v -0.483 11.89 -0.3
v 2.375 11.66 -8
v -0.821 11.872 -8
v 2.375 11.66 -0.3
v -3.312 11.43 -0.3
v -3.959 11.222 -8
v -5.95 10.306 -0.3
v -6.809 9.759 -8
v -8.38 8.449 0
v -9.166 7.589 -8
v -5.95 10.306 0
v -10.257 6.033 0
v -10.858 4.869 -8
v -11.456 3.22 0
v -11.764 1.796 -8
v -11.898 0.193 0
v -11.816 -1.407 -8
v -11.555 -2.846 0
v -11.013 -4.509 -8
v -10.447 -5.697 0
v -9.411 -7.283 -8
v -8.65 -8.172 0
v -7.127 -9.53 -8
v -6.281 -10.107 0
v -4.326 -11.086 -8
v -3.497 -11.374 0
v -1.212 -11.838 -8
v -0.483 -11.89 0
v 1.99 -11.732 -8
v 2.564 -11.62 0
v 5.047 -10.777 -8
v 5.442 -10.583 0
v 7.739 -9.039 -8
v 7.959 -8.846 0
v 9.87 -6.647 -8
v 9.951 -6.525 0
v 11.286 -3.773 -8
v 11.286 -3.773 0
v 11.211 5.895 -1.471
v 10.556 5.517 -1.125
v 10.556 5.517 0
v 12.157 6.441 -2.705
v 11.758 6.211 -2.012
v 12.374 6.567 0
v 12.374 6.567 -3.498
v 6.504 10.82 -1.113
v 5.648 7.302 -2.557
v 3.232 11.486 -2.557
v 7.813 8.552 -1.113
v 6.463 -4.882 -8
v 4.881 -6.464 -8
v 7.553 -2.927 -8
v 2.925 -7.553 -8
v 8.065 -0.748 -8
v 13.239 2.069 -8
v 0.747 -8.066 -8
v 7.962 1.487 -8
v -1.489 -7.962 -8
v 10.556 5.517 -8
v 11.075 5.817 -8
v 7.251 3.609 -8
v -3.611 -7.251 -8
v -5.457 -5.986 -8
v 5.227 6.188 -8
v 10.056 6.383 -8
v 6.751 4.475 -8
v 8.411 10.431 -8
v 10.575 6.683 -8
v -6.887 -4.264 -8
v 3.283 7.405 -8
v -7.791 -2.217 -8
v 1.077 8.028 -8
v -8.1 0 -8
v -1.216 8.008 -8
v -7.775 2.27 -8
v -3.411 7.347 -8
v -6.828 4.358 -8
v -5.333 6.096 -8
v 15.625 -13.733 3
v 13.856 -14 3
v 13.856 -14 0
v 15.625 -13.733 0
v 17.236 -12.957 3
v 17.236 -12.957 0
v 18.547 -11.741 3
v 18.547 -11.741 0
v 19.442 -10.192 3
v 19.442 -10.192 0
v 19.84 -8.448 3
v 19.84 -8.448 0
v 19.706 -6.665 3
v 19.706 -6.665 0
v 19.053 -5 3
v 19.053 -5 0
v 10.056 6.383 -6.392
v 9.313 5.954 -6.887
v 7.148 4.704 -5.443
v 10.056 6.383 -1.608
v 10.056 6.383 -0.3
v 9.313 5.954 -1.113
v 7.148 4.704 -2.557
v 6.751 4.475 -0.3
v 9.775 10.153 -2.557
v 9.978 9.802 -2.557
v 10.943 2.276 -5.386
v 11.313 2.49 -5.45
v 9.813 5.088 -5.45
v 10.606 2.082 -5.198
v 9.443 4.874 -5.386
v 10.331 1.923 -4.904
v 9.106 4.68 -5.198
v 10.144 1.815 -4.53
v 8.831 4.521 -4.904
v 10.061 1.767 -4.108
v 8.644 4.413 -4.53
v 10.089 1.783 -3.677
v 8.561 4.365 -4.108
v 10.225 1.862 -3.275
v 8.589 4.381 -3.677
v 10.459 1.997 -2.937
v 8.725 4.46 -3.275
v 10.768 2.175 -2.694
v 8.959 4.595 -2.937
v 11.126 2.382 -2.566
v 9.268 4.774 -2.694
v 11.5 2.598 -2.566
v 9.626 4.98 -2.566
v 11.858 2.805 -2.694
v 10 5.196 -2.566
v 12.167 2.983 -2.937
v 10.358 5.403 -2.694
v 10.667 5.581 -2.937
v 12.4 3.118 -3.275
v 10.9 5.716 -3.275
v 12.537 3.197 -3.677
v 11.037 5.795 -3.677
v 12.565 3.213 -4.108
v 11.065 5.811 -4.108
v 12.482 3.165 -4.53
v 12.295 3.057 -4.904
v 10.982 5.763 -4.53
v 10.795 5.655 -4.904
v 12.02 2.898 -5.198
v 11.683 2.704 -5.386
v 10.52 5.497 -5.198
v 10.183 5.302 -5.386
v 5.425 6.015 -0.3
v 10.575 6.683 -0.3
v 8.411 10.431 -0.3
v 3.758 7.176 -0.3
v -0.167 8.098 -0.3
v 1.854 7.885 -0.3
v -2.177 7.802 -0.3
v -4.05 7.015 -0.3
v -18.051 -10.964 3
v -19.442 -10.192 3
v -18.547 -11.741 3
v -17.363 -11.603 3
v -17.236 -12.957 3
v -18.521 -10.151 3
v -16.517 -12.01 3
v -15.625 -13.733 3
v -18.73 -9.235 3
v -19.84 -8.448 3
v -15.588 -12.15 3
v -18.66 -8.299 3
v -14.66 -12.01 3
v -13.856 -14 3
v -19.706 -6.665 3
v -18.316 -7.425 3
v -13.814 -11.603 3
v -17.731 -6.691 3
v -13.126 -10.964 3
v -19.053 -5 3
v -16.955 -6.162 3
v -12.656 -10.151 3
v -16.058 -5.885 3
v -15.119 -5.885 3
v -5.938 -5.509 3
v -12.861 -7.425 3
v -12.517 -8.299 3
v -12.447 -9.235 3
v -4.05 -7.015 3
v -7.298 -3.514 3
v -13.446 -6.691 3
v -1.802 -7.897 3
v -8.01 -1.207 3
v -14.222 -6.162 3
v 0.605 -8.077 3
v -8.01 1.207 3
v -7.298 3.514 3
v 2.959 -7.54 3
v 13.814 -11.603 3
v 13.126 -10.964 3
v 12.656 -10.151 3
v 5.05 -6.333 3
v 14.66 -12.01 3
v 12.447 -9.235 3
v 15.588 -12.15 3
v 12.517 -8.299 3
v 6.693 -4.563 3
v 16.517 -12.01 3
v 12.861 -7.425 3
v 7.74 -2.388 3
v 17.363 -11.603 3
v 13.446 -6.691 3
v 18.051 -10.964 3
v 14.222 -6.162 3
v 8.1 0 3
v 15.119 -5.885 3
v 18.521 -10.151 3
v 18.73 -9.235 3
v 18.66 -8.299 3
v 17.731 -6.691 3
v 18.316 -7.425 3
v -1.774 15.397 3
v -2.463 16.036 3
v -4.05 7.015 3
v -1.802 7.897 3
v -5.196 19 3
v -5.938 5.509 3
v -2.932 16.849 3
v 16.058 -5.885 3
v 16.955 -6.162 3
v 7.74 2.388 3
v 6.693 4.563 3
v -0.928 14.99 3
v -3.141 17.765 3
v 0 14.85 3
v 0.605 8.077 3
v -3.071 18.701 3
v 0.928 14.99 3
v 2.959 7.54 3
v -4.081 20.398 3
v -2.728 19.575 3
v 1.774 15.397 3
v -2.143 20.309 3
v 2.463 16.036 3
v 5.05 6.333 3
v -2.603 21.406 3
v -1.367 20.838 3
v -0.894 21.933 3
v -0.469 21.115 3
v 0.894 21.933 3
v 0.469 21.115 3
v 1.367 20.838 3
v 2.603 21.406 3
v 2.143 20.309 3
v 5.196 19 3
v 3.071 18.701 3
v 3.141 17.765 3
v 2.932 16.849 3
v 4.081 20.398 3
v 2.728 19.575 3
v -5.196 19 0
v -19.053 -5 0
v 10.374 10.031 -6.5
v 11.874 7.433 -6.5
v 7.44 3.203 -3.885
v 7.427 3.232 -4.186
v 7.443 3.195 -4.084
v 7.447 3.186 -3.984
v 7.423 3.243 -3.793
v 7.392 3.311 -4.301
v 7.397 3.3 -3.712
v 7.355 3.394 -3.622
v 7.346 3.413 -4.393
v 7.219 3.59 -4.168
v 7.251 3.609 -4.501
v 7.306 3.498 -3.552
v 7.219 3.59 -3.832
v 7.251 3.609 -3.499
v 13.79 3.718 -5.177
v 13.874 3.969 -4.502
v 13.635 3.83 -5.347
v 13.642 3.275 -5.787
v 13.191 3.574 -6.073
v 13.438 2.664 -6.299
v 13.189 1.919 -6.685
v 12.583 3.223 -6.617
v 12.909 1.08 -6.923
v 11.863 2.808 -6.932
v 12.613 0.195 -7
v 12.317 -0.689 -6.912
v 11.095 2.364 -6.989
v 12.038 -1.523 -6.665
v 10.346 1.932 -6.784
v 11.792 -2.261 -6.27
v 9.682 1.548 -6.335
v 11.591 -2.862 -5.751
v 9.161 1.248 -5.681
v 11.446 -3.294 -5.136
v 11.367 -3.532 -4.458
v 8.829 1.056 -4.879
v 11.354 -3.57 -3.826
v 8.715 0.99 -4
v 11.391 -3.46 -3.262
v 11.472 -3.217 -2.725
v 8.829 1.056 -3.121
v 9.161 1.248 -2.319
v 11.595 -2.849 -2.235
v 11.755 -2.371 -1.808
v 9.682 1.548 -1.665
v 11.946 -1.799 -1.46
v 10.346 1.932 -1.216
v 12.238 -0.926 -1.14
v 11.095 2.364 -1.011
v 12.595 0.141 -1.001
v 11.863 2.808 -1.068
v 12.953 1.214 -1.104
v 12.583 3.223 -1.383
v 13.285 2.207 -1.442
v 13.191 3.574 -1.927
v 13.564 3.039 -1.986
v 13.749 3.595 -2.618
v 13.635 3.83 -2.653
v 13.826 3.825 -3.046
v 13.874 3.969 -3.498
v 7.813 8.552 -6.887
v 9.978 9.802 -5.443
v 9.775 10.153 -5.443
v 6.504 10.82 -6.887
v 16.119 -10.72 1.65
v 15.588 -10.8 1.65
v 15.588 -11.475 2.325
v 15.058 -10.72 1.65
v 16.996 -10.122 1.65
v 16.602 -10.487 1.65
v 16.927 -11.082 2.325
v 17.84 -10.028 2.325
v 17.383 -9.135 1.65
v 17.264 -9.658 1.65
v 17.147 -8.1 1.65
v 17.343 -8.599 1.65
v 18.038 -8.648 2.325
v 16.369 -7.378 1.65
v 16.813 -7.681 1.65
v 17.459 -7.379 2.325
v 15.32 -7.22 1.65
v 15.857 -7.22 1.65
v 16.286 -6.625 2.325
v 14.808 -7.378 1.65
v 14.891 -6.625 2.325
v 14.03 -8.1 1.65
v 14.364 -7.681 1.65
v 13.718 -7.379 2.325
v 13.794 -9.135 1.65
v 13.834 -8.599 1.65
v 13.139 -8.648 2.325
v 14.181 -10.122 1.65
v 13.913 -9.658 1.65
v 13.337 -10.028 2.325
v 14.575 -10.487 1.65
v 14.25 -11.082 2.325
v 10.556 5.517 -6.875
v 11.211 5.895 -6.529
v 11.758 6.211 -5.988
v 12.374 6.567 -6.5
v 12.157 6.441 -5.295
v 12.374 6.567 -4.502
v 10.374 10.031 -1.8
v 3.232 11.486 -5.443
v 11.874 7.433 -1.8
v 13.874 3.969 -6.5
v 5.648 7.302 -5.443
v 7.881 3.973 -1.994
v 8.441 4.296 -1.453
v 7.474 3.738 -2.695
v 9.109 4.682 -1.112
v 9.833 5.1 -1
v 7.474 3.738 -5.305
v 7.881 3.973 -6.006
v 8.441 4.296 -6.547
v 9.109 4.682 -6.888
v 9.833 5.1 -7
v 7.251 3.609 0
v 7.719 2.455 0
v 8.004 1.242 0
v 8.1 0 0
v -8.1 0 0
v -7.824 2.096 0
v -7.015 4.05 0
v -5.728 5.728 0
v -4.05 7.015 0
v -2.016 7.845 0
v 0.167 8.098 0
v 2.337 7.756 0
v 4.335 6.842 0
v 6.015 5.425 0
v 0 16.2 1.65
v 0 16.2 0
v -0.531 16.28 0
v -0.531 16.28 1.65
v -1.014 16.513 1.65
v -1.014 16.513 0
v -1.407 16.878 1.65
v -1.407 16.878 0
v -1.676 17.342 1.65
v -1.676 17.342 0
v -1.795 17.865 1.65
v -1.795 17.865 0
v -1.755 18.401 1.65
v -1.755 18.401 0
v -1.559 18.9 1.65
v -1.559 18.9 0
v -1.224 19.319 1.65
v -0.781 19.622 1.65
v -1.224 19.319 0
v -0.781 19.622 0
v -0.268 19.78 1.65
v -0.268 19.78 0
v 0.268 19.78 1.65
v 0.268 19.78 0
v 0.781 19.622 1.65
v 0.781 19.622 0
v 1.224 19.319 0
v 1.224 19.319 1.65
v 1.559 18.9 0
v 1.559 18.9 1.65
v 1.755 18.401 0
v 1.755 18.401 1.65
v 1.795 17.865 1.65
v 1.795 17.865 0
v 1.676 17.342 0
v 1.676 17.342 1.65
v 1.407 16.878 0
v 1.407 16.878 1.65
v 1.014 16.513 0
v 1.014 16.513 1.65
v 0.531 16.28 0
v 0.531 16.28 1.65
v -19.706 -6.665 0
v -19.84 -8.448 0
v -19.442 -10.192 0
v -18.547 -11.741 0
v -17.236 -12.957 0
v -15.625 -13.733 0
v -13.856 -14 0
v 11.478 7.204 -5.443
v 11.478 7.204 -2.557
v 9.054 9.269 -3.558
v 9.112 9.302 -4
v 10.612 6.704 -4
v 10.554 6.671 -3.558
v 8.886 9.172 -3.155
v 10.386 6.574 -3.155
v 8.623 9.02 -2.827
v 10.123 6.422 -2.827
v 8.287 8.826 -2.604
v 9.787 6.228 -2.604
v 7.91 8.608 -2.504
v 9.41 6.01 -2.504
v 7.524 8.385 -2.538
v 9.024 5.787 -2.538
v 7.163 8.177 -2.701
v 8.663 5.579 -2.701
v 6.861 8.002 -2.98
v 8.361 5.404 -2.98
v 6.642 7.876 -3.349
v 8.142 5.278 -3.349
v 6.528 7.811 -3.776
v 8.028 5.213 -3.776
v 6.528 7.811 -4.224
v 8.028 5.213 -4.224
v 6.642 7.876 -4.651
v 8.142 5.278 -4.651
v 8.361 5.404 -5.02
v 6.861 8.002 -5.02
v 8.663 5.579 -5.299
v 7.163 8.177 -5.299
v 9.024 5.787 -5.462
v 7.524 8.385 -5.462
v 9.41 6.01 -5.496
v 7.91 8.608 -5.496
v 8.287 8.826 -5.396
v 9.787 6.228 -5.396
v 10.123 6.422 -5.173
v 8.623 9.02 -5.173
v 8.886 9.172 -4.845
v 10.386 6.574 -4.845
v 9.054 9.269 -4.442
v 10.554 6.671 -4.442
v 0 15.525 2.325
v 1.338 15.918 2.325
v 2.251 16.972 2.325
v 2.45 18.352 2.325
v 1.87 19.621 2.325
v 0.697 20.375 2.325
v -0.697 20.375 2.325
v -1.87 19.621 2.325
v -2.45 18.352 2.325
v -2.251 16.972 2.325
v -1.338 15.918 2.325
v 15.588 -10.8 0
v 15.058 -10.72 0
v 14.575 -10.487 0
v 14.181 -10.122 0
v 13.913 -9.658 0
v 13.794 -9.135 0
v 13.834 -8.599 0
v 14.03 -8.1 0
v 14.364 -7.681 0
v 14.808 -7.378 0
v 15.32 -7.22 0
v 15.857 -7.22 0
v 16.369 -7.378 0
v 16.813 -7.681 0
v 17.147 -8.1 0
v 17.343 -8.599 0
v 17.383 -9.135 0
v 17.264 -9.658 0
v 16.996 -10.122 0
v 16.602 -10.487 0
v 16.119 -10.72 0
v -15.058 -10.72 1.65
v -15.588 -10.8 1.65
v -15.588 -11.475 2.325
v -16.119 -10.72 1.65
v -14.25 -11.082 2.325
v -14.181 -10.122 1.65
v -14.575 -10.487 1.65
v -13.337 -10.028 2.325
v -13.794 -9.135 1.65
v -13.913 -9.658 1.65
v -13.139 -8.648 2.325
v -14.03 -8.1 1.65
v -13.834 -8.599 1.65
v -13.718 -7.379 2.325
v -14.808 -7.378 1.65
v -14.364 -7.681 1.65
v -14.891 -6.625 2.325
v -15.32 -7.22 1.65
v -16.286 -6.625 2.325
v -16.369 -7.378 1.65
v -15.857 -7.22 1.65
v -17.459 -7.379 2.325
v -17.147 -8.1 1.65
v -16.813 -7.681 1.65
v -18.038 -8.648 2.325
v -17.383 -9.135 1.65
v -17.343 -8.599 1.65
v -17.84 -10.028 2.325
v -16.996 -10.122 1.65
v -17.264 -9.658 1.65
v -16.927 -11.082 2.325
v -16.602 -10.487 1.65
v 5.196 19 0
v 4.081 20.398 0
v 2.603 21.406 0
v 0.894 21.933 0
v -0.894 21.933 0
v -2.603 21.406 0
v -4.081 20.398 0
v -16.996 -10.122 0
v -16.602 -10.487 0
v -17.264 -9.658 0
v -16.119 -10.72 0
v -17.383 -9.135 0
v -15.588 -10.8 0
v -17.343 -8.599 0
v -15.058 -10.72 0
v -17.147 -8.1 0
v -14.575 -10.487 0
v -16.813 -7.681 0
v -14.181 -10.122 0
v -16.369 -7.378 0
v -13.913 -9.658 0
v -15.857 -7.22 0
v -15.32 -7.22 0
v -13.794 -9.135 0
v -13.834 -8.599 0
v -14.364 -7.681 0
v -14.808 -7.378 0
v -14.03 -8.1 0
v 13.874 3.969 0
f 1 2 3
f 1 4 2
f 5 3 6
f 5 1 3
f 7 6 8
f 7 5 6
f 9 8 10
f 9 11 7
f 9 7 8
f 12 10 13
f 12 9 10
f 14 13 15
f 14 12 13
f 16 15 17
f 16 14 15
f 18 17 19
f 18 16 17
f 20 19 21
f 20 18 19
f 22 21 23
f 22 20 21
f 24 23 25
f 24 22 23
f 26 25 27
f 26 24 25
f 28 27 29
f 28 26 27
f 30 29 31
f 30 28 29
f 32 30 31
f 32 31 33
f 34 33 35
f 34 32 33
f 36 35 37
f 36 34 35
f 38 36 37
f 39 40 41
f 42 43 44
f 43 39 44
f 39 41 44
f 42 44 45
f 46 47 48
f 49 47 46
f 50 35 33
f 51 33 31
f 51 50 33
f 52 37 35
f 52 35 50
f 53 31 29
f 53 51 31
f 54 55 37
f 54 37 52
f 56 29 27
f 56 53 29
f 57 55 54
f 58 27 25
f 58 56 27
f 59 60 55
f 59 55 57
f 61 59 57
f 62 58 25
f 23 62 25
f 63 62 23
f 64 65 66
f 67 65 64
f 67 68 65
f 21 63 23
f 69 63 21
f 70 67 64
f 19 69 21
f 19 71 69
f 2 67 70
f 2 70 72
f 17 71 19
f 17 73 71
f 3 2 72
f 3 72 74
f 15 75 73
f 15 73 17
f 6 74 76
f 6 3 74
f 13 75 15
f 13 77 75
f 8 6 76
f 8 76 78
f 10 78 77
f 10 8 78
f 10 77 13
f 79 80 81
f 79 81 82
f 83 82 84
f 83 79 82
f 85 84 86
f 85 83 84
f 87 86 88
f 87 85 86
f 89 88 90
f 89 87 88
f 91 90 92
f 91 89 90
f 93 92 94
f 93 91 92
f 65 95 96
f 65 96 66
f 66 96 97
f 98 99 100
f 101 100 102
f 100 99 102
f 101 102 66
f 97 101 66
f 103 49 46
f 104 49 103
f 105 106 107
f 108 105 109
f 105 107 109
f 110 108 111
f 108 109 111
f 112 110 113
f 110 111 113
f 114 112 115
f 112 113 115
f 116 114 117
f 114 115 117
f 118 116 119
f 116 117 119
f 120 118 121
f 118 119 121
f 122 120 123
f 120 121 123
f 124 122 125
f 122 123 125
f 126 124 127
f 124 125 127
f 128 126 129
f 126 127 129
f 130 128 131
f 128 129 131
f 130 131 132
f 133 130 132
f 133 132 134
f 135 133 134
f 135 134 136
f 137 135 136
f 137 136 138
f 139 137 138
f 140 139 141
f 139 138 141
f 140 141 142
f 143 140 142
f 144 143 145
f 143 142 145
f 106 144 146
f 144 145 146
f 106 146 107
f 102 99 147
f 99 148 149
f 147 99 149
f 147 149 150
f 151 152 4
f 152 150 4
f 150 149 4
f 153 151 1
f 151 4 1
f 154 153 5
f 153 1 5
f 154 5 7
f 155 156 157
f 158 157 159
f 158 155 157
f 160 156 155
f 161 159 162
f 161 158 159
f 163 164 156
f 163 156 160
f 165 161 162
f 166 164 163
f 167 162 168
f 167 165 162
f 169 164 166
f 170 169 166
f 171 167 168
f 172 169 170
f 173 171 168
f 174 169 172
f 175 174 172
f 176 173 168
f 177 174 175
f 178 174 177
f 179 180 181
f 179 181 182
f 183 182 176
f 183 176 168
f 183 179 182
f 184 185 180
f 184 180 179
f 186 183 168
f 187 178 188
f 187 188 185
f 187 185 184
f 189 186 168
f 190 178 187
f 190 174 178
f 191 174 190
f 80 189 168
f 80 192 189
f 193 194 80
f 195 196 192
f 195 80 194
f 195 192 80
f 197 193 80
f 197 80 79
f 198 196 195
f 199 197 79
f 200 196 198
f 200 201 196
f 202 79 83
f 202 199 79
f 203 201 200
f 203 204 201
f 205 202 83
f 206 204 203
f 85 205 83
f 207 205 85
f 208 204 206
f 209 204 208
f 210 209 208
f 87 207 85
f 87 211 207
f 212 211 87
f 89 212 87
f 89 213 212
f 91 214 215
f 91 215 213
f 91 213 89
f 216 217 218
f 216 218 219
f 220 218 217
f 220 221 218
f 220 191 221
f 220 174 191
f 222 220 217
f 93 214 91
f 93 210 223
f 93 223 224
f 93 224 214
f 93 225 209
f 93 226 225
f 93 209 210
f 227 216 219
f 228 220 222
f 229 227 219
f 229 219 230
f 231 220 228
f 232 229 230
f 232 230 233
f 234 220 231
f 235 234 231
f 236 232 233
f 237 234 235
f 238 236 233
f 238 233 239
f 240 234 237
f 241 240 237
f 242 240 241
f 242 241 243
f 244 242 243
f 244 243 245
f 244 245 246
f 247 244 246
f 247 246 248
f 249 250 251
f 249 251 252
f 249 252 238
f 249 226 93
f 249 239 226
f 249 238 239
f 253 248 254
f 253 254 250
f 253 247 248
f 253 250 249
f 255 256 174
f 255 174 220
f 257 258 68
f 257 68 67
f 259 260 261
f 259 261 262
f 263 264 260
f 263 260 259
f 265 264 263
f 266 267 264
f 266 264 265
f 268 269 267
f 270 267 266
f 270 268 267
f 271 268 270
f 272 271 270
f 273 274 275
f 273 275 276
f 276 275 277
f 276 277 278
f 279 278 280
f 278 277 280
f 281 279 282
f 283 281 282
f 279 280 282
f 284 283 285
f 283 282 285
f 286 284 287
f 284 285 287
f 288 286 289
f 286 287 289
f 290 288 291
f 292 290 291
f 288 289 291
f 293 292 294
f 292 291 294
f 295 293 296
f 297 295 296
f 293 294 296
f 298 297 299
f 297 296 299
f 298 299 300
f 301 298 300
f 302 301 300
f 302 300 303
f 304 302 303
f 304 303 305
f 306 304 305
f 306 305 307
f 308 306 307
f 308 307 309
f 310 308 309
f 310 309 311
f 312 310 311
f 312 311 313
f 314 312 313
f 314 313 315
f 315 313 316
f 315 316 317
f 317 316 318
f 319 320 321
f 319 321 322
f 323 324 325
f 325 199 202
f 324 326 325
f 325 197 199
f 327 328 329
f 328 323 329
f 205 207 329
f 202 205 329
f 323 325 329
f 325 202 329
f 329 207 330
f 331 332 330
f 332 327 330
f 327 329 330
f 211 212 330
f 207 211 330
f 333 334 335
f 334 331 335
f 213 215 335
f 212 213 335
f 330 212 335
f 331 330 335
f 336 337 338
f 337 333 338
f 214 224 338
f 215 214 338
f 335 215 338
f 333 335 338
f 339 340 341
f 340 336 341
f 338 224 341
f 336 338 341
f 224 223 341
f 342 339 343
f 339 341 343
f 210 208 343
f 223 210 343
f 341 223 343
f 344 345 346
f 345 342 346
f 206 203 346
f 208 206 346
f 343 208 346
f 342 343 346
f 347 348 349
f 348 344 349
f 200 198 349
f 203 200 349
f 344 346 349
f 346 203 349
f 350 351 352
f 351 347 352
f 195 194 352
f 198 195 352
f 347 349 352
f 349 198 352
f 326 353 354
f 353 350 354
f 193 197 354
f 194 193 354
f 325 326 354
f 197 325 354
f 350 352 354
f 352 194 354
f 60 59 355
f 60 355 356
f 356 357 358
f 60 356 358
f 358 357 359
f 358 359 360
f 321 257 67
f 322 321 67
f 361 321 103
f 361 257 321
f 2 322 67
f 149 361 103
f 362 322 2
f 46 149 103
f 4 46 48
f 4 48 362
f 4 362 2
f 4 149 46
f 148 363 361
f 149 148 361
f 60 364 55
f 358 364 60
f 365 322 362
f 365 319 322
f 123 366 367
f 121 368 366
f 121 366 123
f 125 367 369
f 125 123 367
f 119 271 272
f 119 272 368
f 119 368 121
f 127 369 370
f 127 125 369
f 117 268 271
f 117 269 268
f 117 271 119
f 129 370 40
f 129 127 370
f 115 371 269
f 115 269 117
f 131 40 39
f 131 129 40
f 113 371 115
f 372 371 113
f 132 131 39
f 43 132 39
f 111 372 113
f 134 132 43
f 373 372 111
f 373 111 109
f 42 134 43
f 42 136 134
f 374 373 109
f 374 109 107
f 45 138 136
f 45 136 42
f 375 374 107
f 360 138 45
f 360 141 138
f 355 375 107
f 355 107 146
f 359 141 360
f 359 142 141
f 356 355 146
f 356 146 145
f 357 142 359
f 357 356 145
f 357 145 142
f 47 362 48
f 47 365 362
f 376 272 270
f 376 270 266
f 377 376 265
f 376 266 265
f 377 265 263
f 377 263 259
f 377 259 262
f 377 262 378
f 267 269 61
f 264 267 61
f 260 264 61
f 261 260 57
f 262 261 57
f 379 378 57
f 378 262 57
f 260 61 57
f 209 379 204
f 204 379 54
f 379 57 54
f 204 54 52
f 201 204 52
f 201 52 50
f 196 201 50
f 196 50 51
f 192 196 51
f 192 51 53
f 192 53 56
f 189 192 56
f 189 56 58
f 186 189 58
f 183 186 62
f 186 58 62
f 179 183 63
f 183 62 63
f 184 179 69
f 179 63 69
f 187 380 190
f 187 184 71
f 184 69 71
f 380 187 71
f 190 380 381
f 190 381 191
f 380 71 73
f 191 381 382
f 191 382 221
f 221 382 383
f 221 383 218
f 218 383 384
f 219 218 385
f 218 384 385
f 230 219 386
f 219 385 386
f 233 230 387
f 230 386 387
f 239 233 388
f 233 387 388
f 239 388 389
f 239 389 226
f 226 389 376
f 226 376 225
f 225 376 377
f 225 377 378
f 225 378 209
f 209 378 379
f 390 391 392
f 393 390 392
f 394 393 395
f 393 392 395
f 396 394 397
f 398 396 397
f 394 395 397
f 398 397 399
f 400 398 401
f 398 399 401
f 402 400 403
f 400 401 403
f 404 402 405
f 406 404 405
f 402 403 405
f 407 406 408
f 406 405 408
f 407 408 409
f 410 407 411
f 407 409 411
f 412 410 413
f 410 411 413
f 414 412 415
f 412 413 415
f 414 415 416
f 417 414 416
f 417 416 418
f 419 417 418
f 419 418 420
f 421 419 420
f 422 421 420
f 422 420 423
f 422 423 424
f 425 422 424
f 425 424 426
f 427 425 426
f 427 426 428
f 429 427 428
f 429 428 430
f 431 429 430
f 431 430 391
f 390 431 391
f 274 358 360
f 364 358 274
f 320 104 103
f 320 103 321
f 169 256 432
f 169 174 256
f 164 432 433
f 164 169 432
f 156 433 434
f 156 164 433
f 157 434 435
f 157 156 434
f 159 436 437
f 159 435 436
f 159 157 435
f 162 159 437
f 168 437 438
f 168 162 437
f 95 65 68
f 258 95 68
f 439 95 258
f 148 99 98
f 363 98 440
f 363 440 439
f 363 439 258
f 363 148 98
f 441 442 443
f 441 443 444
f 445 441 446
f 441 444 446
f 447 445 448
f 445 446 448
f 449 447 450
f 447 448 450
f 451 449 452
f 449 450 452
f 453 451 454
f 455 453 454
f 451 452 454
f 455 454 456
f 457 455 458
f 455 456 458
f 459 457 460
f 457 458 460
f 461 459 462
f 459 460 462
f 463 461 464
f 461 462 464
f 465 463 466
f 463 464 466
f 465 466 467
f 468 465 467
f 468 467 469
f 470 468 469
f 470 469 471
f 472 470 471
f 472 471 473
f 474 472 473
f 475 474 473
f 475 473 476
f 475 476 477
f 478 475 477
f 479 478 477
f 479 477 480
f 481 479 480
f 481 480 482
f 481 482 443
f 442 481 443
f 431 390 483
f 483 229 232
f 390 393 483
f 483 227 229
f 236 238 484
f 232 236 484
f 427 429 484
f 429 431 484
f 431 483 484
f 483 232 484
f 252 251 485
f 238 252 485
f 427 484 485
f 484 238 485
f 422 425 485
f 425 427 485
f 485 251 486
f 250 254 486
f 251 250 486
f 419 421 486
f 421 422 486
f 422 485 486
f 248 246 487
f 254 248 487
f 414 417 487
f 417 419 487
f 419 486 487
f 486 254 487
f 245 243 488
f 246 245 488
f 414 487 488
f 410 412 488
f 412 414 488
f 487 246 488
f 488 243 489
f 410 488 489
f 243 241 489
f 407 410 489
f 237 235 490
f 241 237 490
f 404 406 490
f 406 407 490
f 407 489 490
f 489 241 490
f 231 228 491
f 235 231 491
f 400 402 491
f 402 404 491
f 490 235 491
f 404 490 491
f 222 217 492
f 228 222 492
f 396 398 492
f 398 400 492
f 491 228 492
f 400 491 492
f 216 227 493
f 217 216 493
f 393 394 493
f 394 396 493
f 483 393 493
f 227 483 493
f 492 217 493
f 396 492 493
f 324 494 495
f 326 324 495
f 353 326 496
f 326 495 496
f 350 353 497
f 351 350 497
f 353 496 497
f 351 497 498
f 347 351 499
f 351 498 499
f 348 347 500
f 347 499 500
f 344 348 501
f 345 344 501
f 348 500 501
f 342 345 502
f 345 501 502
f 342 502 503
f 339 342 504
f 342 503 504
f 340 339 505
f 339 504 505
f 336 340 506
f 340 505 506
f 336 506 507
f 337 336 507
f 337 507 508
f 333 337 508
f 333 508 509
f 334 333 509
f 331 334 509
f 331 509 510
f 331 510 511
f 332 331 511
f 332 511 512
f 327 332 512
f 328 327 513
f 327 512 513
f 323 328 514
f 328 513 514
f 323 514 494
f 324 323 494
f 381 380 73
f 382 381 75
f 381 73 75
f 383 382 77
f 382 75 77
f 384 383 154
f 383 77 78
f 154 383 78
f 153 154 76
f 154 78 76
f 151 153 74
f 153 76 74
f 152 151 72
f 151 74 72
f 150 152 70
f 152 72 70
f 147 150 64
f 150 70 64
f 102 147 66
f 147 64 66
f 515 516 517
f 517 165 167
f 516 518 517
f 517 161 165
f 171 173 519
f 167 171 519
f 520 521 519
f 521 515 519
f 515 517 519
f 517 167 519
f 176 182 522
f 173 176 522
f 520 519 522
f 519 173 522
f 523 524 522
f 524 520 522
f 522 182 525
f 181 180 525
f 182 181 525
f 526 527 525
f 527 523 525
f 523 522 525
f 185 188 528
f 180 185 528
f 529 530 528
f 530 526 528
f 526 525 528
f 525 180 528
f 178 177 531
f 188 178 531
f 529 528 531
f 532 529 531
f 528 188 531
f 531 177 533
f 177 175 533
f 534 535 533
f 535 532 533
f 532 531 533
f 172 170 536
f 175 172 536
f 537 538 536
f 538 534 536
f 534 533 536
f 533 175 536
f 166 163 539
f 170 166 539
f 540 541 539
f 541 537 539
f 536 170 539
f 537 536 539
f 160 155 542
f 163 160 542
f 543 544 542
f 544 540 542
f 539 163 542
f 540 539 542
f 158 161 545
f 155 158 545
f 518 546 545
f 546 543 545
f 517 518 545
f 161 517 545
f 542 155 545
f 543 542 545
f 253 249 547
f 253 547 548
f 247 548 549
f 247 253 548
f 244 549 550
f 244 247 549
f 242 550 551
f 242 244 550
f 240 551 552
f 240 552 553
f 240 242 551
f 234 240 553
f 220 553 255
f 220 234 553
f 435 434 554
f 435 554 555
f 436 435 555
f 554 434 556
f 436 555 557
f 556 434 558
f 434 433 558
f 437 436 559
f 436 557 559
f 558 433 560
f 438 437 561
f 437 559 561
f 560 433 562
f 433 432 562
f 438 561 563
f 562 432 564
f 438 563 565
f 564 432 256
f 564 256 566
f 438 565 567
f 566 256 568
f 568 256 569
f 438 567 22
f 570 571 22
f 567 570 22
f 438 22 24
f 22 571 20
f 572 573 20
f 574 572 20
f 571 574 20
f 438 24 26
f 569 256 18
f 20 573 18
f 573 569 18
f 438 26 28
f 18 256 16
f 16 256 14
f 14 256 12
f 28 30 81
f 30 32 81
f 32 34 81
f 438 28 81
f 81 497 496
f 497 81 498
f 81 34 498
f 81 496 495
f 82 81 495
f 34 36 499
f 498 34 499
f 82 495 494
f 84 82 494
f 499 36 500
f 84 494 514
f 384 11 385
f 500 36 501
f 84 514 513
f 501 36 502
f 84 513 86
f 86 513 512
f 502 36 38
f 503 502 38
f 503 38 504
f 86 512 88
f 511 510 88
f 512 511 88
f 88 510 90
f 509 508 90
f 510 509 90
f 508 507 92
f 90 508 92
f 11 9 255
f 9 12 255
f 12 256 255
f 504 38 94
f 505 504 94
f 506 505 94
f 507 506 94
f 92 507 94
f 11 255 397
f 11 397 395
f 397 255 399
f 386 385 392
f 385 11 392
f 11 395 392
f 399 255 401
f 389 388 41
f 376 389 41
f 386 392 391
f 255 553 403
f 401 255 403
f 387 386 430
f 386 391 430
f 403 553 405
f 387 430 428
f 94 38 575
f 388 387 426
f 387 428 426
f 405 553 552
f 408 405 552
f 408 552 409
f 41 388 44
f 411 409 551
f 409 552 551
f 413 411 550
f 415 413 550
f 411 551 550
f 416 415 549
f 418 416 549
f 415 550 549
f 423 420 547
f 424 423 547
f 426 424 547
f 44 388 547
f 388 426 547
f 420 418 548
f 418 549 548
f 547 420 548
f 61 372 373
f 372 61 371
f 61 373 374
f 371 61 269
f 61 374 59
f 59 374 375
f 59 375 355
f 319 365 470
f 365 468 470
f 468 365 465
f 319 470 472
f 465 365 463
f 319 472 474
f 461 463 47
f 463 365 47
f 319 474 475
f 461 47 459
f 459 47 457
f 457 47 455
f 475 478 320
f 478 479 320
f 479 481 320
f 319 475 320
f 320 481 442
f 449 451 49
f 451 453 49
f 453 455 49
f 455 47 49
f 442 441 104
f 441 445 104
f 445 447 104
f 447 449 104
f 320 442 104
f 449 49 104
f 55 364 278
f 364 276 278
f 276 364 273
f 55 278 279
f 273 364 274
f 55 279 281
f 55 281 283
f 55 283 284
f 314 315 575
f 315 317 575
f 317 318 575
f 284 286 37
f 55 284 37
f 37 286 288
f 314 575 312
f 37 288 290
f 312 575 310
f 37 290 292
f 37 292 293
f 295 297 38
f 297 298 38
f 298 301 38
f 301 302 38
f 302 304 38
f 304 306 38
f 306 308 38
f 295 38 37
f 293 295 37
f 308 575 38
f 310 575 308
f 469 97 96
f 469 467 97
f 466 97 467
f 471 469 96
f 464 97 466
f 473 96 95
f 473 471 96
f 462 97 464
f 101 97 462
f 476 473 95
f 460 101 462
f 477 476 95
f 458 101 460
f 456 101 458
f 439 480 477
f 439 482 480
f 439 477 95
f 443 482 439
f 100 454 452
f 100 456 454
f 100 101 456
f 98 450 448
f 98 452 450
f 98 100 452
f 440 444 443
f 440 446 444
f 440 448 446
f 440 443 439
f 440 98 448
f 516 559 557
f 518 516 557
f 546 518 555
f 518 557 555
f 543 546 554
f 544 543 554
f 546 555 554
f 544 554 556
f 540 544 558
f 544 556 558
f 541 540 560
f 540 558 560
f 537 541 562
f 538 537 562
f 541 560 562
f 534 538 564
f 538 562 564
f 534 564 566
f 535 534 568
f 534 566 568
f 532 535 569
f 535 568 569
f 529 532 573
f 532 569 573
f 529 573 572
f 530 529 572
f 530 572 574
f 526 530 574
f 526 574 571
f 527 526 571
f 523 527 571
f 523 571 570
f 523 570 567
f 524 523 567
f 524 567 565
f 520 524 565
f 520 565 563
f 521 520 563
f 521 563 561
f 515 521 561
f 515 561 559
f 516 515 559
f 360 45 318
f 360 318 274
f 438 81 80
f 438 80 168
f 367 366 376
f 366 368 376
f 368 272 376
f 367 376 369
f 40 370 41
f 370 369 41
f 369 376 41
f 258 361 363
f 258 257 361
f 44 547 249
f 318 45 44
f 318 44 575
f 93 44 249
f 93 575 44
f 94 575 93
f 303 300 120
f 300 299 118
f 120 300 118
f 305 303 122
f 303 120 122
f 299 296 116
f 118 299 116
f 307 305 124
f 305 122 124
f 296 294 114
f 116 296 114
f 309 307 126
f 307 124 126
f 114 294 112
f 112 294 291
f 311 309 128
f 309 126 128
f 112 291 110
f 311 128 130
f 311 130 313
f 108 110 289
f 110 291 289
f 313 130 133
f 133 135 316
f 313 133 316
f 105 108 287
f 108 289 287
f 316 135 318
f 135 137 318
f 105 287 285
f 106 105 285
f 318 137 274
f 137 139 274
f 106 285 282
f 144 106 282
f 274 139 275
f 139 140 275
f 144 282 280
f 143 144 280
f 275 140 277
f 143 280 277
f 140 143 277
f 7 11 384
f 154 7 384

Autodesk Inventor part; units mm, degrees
ref_plane "YZ Plane" through (0, 0, 0) normal (1, 0, 0) x (0, 1, 0)
ref_plane "XZ Plane" through (0, 0, 0) normal (0, 1, 0) x (-1, 0, 0)
ref_plane "XY Plane" through (0, 0, 0) normal (0, 0, 1) x (1, 0, 0)
sketch "Sketch1" plane through (0, 0, 0) normal (0, 0, 1) x (1, 0, 0)
  circle A0 centre (0, 16) radius 2
  circle A1 centre (-13.8564, -8) radius 2
  circle A2 centre (13.8564, -8) radius 2
  line L0 (0, 28) -> (24.2487, -14)
  line L1 (24.2487, -14) -> (-24.2487, -14)
  line L2 (-24.2487, -14) -> (0, 28)
  circle A3 centre (0, 0) radius 8.1
  line L3 (0, 16) -> (13.8564, -8) construction
  line L4 (13.8564, -8) -> (-13.8564, -8) construction
  line L5 (-13.8564, -8) -> (0, 16) construction
  dimension "d0" = 16.2
  dimension "d1" = 4
  dimension "d2" = 4
  dimension "d3" = 4
  dimension "d4" = 16
  dimension "d5" = 6
extrude "Extrusion1" add sketch "Sketch1" along normal blind 3 contours A0 | A1 | A2 | L0 L1 L2
fillet "Fillet1" radius 6 3 edges at (0, 28, 1.5) (24.2487, -14, 1.5) (-24.2487, -14, 1.5)
sketch "Sketch2" plane through (0, 0, 0) normal (0, 0, -1) x (-1, 0, 0)
  circle A0 centre (0, 0) radius 8.1 projected
  arc A1 (13.8564, -14) -> (19.0526, -5) centre (13.8564, -8) ccw projected
  line L0 (5.1962, 19) -> (19.0526, -5) projected
  arc A2 (5.1962, 19) -> (-5.1962, 19) centre (0, 16) ccw projected
  line L1 (-19.0526, -5) -> (-5.1962, 19) projected
  arc A3 (-19.0526, -5) -> (-13.8564, -14) centre (-13.8564, -8) ccw projected
  line L2 (13.8564, -14) -> (-13.8564, -14) projected
  circle A4 centre (0, 0) radius 11.9
  line L3 (-10.5557, 5.517) -> (-10.0557, 6.383)
  line L4 (-10.0557, 6.383) -> (-6.7514, 4.4753)
  line L5 (-6.7514, 4.4753) -> (-7.2514, 3.6093)
  line L6 (-7.2514, 3.6093) -> (-10.5557, 5.517)
  line L7 (0, 0) -> (-7.0014, 4.0423) construction
  circle A5 centre (0, 0) radius 8.1 construction
  line L8 (-10.0557, 6.383) -> (-11.8744, 7.433)
  line L9 (-10.5557, 5.517) -> (-12.3744, 6.567)
  line L10 (-19.0526, -5) -> (-5.1962, 19) projected
  line L11 (-13.8744, 3.9689) -> (-11.286, -3.7732)
  line L12 (-10.3744, 10.0311) -> (-2.3753, 11.6605)
  point P0 (-10.3744, 10.0311)
  point P1 (-7.2514, 3.6093)
  point P2 (-12.3744, 6.567)
  point P3 (-13.8744, 3.9689)
  dimension "d9" = 3.8
  dimension "d10" = 1
  dimension "d11" = 3
  dimension "d12" = 3
extrude "Extrusion2" add sketch "Sketch2" along normal blind 8 contours A0 L4 A4 L6 | L4 L8 L1 L12 A4 | A4 L11 L1 L9 L6 picked at (10.5244, -0.9233)
sketch "Sketch3" plane through (6.7514, 4.4753, -8) normal (0.5, -0.8660254, 0) x (0.8660254, 0.5, 0)
  circle A0 centre (2.9577, 4) radius 1.5
  line L0 (0.4577, 5.4434) -> (2.9577, 6.8868)
  line L1 (2.9577, 6.8868) -> (5.4577, 5.4434)
  line L2 (5.4577, 5.4434) -> (5.4577, 2.5566)
  line L3 (5.4577, 2.5566) -> (2.9577, 1.1132)
  line L4 (2.9577, 1.1132) -> (0.4577, 2.5566)
  line L5 (0.4577, 2.5566) -> (0.4577, 5.4434)
  line L6 (5.9154, 8) -> (5.9154, 0) projected
  line L7 (5.9154, 0) -> (0, 0) projected
  point P0 (-8.0846, 8)
  point P1 (5.9154, 4)
  point P2 (2.9577, 0)
  dimension "d15" = 3
  dimension "d16" = 5
extrude "Extrusion3" cut sketch "Sketch3" against normal blind 8.75 contours A0 | L0 L1 L2 L3 L4 L5
extrude "Extrusion4" add sketch "Sketch3" against normal blind 3
sketch "Sketch4" plane through (12.3744, 6.567, 0) normal (-0.5, 0.8660254, 0) x (0.8660254, 0.5, 0)
  circle A0 centre (-2.9577, 4) radius 3
  circle A1 centre (-2.9577, 4) radius 1.5
  line L0 (-5.9154, 0) -> (-5.9154, 8) projected
  line L1 (-5.9154, 8) -> (0, 8) projected
  line L2 (0, 0) -> (0, 8) projected
  point P0 (-14, 0)
  point P1 (-5.9154, 4)
  point P2 (-2.9577, 8)
  point P3 (0, 3.4981)
  point P4 (0, 4.5019)
  dimension "d21" = 6
  dimension "d22" = 3
extrude "Extrusion5" cut sketch "Sketch4" against normal through all contours A0 L2 | L2 A0 L0 | L0 A0 | A1
extrude "Extrusion6" add sketch "Sketch4" against normal blind 3 contours L2 A0 L0 | L0 A0 | A1
sketch "Sketch5" plane through (0, 0, 0) normal (0, 0, -1) x (-1, 0, 0)
  line L0 (8.9761, 15.5471) -> (-8.9761, -15.5471)
  line L1 (-7.2514, 3.6093) -> (-12.3744, 6.567) projected
  line L2 (8.9761, 15.5471) -> (-20.2638, 11.6993)
  line L3 (-20.2638, 11.6993) -> (-8.9761, -15.5471)
  line L4 (0, 0) -> (-20.2638, 11.6993)
  line L5 (-11.8744, 7.433) -> (-6.7514, 4.4753) projected
extrude "Extrusion7" cut sketch "Sketch5" along normal blind 0.3 contours L0 L4 L2
sketch "Sketch6" plane through (0, 0, 3) normal (0, 0, 1) x (1, 0, 0)
  arc A0 (-19.0526, -5) -> (-13.8564, -14) centre (-13.8564, -8) ccw projected
  line L0 (-13.8564, -14) -> (13.8564, -14) projected
  arc A1 (13.8564, -14) -> (19.0526, -5) centre (13.8564, -8) ccw projected
  line L1 (19.0526, -5) -> (5.1962, 19) projected
  arc A2 (5.1962, 19) -> (-5.1962, 19) centre (0, 16) ccw projected
  line L2 (-5.1962, 19) -> (-19.0526, -5) projected
  circle A3 centre (0, 0) radius 8.1 projected
  line L3 (0, 0) -> (0, 18) construction
  line L4 (0, 0) -> (15.5885, -9) construction
  line L5 (0, 0) -> (-15.5885, -9) construction
  dimension "d32" = 2
  dimension "d33" = 2
  dimension "d34" = 2
hole "Hole1" at (0, 18, 3) at (15.5885, -9, 3) at (-15.5885, -9, 3) direction (0, 0, -1) diameter 3.6 end through all countersink diameter 6.3 countersink angle 90 clearance for "Flat Head Machine Screw" size "M3" standard "Ansi Metric M Profile"
sketch "Sketch7" plane through (11.3129, 2.49, -4) normal (0.5, -0.8660254, 0) x (0, 0, 1)
  arc A0 (0.5019, -2.9577) -> (-0.5019, -2.9577) centre (0, 0) ccw projected
  line L0 (-0.5019, -2.9577) -> (0.5019, -2.9577) projected
  point P0 (4, 11.0423)
hole "Hole2" at (11.3129, 2.49, -4) direction (-0.5, 0.8660254, 0) diameter 2.9 depth 7 tip angle 118 clearance for "Flat Head Machine Screw" size "M2.5" standard "Ansi Metric M Profile"
chamfer "Chamfer3" distance 1.5 angle 45 3 edges at (11.1244, 8.7321, -0.3) (11.1244, 8.7321, -8) (13.1244, 5.2679, -8)
equation "\"d33\" = d32"
equation "\"d34\" = d32"
properties part number "Motor Mount Insert"
